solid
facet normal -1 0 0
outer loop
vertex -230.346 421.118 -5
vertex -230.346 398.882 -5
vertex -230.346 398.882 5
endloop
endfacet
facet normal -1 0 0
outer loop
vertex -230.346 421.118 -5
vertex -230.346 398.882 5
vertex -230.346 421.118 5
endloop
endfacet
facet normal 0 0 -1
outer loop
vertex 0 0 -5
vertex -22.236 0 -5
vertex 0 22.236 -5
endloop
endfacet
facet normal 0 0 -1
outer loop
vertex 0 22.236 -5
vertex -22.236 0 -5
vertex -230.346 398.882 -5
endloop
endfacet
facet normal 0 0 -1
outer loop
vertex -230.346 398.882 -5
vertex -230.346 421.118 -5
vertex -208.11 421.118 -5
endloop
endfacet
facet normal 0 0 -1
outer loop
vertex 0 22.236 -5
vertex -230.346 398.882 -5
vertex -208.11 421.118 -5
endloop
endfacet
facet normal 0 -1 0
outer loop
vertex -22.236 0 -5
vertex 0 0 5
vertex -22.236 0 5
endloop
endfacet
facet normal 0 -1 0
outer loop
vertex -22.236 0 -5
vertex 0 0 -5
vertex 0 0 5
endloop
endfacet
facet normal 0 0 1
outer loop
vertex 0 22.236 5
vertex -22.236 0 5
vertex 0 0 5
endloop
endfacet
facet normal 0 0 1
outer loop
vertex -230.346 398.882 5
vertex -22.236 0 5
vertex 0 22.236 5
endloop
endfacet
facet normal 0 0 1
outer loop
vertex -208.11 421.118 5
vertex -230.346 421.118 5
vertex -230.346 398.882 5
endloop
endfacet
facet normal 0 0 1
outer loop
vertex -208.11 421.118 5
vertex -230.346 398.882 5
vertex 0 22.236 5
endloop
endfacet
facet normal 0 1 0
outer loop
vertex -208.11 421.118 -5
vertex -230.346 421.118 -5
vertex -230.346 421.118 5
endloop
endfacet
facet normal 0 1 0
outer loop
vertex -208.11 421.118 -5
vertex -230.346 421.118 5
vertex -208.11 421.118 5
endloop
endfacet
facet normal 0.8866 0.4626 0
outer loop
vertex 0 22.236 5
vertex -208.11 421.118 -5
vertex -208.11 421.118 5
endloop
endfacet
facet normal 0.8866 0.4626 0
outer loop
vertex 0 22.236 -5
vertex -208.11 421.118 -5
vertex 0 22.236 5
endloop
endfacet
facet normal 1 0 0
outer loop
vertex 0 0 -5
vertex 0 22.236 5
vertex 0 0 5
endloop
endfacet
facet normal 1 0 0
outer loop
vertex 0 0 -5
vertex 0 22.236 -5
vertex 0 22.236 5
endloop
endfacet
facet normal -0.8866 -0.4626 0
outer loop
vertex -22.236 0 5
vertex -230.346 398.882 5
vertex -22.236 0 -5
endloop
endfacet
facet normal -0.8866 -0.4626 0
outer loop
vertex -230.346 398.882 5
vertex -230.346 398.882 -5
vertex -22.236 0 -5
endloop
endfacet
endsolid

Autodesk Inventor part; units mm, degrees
ref_plane "YZ Plane" through (0, 0, 0) normal (1, 0, 0) x (0, 1, 0)
ref_plane "XZ Plane" through (0, 0, 0) normal (0, 1, 0) x (-1, 0, 0)
ref_plane "XY Plane" through (0, 0, 0) normal (0, 0, 1) x (1, 0, 0)
sketch "Sketch1" plane through (0, 0, 0) normal (0, 0, 1) x (1, 0, 0)
  line L0 (-276.4159, 0) -> (46.0693, 0) construction
  line L1 (-22.2362, 22.2362) -> (0, 22.2362) construction
  line L2 (0, 22.2362) -> (0, 0)
  line L3 (0, 0) -> (-22.2362, 0)
  line L4 (-22.2362, 0) -> (-22.2362, 22.2362) construction
  line L5 (-22.2362, 22.2362) -> (0, 0) construction
  line L6 (0, 22.2362) -> (-22.2362, 0) construction
  line L7 (-230.3465, 421.1181) -> (-208.1103, 421.1181)
  line L8 (-208.1103, 421.1181) -> (-208.1103, 398.8819) construction
  line L9 (-208.1103, 398.8819) -> (-230.3465, 398.8819) construction
  line L10 (-230.3465, 398.8819) -> (-230.3465, 421.1181)
  line L11 (-230.3465, 421.1181) -> (-208.1103, 398.8819) construction
  line L12 (-208.1103, 421.1181) -> (-230.3465, 398.8819) construction
  line L13 (-230.3465, 398.8819) -> (-22.2362, 0)
  line L14 (-208.1103, 421.1181) -> (0, 22.2362)
  point P0 (-11.1181, 11.1181)
  point P1 (-219.2284, 410)
  dimension "d16" = 480
  dimension "d17" = 30
  dimension "d18" = 410
extrude "Extrusion1" add sketch "Sketch1" along normal mid plane 10
properties part number "Support - Left"
